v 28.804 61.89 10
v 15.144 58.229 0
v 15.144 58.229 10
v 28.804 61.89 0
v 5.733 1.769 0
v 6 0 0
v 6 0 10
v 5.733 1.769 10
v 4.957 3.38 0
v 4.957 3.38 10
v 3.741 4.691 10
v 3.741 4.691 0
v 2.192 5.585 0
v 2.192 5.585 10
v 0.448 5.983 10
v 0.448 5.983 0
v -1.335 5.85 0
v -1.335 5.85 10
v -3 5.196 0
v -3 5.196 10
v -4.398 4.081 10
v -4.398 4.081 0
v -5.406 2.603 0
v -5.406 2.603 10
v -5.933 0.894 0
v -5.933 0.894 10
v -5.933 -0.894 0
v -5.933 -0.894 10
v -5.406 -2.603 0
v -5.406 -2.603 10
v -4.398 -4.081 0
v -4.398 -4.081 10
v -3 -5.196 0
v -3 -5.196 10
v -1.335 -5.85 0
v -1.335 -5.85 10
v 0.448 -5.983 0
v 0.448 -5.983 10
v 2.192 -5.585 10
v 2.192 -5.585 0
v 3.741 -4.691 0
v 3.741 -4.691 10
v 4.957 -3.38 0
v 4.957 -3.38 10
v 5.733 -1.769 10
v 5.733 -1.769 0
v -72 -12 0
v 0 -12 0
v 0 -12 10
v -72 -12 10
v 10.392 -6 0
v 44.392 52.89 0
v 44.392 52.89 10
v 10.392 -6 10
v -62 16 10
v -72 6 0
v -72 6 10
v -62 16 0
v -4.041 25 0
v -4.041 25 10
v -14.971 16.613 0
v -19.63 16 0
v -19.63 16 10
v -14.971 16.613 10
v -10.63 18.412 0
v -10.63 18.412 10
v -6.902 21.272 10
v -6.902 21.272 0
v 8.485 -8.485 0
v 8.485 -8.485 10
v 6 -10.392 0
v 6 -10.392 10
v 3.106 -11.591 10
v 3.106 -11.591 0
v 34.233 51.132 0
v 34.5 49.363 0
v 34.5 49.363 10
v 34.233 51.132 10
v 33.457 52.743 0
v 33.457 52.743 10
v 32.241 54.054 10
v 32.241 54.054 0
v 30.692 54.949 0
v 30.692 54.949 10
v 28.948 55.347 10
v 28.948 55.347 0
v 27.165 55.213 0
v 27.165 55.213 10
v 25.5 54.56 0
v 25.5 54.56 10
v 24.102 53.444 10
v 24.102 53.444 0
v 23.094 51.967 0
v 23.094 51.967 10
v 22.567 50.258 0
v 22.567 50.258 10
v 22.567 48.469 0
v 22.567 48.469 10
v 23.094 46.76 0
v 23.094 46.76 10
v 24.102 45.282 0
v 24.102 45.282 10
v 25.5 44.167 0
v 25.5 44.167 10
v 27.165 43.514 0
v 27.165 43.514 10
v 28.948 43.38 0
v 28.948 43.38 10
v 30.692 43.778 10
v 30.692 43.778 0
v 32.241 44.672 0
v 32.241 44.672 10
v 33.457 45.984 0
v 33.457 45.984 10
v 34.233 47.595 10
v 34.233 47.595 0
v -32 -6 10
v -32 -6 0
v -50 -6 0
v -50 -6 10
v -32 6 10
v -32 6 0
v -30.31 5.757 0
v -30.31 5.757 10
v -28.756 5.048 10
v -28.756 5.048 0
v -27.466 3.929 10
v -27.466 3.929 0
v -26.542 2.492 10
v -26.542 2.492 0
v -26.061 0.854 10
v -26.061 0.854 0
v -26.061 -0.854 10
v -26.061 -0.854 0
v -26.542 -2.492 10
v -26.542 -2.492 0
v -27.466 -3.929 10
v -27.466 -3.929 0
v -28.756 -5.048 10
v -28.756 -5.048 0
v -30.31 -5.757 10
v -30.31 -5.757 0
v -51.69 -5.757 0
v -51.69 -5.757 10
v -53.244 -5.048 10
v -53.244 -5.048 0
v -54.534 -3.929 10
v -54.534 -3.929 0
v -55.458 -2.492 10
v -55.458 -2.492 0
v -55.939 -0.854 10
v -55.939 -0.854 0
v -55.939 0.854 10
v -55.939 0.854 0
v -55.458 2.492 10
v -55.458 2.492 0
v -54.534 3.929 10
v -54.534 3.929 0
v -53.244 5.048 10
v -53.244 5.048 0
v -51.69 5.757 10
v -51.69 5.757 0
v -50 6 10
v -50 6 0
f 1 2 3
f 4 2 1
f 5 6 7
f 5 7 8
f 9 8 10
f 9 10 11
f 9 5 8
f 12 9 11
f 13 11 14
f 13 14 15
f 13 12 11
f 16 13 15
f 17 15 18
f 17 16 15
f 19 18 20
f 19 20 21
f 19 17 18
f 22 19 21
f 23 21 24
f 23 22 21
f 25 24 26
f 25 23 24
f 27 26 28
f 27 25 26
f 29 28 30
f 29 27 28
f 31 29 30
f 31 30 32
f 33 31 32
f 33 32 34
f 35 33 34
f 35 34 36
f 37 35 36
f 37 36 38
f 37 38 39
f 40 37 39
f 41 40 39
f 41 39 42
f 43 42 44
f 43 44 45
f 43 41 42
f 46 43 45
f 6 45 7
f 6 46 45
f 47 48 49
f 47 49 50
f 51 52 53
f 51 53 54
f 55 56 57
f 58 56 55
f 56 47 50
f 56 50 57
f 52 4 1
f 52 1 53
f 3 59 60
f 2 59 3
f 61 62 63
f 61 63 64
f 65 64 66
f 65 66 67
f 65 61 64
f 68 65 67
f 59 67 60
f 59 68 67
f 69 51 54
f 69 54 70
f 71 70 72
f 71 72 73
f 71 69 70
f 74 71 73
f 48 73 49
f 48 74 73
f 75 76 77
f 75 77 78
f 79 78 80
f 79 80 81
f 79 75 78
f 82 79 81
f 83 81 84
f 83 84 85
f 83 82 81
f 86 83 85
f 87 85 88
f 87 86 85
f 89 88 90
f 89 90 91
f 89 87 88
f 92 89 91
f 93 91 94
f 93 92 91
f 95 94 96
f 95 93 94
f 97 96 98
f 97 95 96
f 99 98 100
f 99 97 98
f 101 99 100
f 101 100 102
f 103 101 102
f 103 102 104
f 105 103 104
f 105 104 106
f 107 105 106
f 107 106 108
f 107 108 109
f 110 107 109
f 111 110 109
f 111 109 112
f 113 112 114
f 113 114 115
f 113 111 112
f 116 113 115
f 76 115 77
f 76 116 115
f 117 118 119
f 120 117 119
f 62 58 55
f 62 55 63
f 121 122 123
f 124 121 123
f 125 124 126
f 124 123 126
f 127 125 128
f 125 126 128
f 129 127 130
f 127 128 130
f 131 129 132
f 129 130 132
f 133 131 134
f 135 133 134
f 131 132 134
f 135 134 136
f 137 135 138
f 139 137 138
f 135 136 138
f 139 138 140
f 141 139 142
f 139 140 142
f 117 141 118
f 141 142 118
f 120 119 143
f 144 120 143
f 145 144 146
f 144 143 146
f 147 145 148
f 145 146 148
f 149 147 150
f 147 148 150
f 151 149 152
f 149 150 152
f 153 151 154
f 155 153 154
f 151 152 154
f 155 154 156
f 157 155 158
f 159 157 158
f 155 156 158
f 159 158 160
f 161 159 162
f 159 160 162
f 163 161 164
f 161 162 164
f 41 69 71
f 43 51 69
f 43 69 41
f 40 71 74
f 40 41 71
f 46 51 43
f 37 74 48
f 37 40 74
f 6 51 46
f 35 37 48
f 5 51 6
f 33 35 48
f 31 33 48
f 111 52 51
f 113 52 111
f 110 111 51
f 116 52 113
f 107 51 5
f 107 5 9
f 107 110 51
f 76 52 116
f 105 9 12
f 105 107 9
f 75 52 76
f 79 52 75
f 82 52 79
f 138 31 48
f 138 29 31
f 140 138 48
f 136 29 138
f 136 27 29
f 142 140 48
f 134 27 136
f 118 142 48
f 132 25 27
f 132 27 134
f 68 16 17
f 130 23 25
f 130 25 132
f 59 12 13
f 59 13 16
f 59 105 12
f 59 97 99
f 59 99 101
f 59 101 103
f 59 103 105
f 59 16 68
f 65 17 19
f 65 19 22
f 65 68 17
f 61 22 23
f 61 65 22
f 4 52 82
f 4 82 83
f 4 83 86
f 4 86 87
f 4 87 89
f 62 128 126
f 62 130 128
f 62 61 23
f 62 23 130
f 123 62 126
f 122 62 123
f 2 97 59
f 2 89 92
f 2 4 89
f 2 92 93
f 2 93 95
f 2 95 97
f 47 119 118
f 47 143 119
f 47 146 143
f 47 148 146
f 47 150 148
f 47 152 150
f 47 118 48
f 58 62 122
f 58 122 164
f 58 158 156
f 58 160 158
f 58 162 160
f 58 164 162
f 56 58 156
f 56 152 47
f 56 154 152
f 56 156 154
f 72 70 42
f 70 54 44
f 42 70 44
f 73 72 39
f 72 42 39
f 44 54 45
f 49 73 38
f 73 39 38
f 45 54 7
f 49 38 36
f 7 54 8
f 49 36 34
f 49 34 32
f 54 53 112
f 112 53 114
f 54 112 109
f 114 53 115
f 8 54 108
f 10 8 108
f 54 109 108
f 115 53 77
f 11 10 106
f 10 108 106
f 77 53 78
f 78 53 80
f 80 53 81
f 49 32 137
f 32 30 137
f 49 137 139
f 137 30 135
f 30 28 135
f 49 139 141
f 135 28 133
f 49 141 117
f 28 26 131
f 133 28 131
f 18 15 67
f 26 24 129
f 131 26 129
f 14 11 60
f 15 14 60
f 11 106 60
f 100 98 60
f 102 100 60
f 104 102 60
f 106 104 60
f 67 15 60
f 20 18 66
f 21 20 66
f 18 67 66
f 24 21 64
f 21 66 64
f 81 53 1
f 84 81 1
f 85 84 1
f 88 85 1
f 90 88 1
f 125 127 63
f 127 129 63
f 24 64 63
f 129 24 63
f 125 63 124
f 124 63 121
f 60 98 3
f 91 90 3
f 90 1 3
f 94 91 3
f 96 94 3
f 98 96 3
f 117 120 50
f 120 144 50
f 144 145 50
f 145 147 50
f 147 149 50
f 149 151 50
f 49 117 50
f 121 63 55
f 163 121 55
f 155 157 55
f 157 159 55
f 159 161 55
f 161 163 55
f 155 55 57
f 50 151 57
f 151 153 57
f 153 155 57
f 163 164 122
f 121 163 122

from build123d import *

# Parameters (mm, degrees)
CROQUIS1_R              = 6
SALIENTE_EXTRUIR1_DEPTH = 10


with BuildPart() as part:
    # Croquis1 → Saliente-Extruir1 (new body)
    with BuildSketch(Plane.XY):
        with BuildLine():
            Line((-62, 16), (-19.629909152, 16))
            ThreePointArc((-19.629909152, 16), (-10.629909152, 18.411542732), (-4.041451884, 25))
            Line((-4.041451884, 25), (15.143593539, 58.229473419))
            Line((15.143593539, 58.229473419), (28.803847577, 61.889727457))
            Line((28.803847577, 61.889727457), (44.392304845, 52.889727457))
            Line((44.392304845, 52.889727457), (10.392304845, -6))
            ThreePointArc((10.392304845, -6), (6, -10.392304845), (0, -12))
            Line((0, -12), (-72, -12))
            Line((-72, -12), (-72, 6))
            Line((-72, 6), (-62, 16))
        make_face()
        Circle(CROQUIS1_R, mode=Mode.SUBTRACT)
        with Locations((28.5, 49.363448016)):
            Circle(CROQUIS1_R, mode=Mode.SUBTRACT)
        with BuildLine():
            Line((-32, -6), (-50, -6))
            ThreePointArc((-50, -6), (-56, 0), (-50, 6))
            Line((-50, 6), (-32, 6))
            ThreePointArc((-32, 6), (-26, 0), (-32, -6))
        make_face(mode=Mode.SUBTRACT)
    extrude(amount=SALIENTE_EXTRUIR1_DEPTH)


solid = part.part
